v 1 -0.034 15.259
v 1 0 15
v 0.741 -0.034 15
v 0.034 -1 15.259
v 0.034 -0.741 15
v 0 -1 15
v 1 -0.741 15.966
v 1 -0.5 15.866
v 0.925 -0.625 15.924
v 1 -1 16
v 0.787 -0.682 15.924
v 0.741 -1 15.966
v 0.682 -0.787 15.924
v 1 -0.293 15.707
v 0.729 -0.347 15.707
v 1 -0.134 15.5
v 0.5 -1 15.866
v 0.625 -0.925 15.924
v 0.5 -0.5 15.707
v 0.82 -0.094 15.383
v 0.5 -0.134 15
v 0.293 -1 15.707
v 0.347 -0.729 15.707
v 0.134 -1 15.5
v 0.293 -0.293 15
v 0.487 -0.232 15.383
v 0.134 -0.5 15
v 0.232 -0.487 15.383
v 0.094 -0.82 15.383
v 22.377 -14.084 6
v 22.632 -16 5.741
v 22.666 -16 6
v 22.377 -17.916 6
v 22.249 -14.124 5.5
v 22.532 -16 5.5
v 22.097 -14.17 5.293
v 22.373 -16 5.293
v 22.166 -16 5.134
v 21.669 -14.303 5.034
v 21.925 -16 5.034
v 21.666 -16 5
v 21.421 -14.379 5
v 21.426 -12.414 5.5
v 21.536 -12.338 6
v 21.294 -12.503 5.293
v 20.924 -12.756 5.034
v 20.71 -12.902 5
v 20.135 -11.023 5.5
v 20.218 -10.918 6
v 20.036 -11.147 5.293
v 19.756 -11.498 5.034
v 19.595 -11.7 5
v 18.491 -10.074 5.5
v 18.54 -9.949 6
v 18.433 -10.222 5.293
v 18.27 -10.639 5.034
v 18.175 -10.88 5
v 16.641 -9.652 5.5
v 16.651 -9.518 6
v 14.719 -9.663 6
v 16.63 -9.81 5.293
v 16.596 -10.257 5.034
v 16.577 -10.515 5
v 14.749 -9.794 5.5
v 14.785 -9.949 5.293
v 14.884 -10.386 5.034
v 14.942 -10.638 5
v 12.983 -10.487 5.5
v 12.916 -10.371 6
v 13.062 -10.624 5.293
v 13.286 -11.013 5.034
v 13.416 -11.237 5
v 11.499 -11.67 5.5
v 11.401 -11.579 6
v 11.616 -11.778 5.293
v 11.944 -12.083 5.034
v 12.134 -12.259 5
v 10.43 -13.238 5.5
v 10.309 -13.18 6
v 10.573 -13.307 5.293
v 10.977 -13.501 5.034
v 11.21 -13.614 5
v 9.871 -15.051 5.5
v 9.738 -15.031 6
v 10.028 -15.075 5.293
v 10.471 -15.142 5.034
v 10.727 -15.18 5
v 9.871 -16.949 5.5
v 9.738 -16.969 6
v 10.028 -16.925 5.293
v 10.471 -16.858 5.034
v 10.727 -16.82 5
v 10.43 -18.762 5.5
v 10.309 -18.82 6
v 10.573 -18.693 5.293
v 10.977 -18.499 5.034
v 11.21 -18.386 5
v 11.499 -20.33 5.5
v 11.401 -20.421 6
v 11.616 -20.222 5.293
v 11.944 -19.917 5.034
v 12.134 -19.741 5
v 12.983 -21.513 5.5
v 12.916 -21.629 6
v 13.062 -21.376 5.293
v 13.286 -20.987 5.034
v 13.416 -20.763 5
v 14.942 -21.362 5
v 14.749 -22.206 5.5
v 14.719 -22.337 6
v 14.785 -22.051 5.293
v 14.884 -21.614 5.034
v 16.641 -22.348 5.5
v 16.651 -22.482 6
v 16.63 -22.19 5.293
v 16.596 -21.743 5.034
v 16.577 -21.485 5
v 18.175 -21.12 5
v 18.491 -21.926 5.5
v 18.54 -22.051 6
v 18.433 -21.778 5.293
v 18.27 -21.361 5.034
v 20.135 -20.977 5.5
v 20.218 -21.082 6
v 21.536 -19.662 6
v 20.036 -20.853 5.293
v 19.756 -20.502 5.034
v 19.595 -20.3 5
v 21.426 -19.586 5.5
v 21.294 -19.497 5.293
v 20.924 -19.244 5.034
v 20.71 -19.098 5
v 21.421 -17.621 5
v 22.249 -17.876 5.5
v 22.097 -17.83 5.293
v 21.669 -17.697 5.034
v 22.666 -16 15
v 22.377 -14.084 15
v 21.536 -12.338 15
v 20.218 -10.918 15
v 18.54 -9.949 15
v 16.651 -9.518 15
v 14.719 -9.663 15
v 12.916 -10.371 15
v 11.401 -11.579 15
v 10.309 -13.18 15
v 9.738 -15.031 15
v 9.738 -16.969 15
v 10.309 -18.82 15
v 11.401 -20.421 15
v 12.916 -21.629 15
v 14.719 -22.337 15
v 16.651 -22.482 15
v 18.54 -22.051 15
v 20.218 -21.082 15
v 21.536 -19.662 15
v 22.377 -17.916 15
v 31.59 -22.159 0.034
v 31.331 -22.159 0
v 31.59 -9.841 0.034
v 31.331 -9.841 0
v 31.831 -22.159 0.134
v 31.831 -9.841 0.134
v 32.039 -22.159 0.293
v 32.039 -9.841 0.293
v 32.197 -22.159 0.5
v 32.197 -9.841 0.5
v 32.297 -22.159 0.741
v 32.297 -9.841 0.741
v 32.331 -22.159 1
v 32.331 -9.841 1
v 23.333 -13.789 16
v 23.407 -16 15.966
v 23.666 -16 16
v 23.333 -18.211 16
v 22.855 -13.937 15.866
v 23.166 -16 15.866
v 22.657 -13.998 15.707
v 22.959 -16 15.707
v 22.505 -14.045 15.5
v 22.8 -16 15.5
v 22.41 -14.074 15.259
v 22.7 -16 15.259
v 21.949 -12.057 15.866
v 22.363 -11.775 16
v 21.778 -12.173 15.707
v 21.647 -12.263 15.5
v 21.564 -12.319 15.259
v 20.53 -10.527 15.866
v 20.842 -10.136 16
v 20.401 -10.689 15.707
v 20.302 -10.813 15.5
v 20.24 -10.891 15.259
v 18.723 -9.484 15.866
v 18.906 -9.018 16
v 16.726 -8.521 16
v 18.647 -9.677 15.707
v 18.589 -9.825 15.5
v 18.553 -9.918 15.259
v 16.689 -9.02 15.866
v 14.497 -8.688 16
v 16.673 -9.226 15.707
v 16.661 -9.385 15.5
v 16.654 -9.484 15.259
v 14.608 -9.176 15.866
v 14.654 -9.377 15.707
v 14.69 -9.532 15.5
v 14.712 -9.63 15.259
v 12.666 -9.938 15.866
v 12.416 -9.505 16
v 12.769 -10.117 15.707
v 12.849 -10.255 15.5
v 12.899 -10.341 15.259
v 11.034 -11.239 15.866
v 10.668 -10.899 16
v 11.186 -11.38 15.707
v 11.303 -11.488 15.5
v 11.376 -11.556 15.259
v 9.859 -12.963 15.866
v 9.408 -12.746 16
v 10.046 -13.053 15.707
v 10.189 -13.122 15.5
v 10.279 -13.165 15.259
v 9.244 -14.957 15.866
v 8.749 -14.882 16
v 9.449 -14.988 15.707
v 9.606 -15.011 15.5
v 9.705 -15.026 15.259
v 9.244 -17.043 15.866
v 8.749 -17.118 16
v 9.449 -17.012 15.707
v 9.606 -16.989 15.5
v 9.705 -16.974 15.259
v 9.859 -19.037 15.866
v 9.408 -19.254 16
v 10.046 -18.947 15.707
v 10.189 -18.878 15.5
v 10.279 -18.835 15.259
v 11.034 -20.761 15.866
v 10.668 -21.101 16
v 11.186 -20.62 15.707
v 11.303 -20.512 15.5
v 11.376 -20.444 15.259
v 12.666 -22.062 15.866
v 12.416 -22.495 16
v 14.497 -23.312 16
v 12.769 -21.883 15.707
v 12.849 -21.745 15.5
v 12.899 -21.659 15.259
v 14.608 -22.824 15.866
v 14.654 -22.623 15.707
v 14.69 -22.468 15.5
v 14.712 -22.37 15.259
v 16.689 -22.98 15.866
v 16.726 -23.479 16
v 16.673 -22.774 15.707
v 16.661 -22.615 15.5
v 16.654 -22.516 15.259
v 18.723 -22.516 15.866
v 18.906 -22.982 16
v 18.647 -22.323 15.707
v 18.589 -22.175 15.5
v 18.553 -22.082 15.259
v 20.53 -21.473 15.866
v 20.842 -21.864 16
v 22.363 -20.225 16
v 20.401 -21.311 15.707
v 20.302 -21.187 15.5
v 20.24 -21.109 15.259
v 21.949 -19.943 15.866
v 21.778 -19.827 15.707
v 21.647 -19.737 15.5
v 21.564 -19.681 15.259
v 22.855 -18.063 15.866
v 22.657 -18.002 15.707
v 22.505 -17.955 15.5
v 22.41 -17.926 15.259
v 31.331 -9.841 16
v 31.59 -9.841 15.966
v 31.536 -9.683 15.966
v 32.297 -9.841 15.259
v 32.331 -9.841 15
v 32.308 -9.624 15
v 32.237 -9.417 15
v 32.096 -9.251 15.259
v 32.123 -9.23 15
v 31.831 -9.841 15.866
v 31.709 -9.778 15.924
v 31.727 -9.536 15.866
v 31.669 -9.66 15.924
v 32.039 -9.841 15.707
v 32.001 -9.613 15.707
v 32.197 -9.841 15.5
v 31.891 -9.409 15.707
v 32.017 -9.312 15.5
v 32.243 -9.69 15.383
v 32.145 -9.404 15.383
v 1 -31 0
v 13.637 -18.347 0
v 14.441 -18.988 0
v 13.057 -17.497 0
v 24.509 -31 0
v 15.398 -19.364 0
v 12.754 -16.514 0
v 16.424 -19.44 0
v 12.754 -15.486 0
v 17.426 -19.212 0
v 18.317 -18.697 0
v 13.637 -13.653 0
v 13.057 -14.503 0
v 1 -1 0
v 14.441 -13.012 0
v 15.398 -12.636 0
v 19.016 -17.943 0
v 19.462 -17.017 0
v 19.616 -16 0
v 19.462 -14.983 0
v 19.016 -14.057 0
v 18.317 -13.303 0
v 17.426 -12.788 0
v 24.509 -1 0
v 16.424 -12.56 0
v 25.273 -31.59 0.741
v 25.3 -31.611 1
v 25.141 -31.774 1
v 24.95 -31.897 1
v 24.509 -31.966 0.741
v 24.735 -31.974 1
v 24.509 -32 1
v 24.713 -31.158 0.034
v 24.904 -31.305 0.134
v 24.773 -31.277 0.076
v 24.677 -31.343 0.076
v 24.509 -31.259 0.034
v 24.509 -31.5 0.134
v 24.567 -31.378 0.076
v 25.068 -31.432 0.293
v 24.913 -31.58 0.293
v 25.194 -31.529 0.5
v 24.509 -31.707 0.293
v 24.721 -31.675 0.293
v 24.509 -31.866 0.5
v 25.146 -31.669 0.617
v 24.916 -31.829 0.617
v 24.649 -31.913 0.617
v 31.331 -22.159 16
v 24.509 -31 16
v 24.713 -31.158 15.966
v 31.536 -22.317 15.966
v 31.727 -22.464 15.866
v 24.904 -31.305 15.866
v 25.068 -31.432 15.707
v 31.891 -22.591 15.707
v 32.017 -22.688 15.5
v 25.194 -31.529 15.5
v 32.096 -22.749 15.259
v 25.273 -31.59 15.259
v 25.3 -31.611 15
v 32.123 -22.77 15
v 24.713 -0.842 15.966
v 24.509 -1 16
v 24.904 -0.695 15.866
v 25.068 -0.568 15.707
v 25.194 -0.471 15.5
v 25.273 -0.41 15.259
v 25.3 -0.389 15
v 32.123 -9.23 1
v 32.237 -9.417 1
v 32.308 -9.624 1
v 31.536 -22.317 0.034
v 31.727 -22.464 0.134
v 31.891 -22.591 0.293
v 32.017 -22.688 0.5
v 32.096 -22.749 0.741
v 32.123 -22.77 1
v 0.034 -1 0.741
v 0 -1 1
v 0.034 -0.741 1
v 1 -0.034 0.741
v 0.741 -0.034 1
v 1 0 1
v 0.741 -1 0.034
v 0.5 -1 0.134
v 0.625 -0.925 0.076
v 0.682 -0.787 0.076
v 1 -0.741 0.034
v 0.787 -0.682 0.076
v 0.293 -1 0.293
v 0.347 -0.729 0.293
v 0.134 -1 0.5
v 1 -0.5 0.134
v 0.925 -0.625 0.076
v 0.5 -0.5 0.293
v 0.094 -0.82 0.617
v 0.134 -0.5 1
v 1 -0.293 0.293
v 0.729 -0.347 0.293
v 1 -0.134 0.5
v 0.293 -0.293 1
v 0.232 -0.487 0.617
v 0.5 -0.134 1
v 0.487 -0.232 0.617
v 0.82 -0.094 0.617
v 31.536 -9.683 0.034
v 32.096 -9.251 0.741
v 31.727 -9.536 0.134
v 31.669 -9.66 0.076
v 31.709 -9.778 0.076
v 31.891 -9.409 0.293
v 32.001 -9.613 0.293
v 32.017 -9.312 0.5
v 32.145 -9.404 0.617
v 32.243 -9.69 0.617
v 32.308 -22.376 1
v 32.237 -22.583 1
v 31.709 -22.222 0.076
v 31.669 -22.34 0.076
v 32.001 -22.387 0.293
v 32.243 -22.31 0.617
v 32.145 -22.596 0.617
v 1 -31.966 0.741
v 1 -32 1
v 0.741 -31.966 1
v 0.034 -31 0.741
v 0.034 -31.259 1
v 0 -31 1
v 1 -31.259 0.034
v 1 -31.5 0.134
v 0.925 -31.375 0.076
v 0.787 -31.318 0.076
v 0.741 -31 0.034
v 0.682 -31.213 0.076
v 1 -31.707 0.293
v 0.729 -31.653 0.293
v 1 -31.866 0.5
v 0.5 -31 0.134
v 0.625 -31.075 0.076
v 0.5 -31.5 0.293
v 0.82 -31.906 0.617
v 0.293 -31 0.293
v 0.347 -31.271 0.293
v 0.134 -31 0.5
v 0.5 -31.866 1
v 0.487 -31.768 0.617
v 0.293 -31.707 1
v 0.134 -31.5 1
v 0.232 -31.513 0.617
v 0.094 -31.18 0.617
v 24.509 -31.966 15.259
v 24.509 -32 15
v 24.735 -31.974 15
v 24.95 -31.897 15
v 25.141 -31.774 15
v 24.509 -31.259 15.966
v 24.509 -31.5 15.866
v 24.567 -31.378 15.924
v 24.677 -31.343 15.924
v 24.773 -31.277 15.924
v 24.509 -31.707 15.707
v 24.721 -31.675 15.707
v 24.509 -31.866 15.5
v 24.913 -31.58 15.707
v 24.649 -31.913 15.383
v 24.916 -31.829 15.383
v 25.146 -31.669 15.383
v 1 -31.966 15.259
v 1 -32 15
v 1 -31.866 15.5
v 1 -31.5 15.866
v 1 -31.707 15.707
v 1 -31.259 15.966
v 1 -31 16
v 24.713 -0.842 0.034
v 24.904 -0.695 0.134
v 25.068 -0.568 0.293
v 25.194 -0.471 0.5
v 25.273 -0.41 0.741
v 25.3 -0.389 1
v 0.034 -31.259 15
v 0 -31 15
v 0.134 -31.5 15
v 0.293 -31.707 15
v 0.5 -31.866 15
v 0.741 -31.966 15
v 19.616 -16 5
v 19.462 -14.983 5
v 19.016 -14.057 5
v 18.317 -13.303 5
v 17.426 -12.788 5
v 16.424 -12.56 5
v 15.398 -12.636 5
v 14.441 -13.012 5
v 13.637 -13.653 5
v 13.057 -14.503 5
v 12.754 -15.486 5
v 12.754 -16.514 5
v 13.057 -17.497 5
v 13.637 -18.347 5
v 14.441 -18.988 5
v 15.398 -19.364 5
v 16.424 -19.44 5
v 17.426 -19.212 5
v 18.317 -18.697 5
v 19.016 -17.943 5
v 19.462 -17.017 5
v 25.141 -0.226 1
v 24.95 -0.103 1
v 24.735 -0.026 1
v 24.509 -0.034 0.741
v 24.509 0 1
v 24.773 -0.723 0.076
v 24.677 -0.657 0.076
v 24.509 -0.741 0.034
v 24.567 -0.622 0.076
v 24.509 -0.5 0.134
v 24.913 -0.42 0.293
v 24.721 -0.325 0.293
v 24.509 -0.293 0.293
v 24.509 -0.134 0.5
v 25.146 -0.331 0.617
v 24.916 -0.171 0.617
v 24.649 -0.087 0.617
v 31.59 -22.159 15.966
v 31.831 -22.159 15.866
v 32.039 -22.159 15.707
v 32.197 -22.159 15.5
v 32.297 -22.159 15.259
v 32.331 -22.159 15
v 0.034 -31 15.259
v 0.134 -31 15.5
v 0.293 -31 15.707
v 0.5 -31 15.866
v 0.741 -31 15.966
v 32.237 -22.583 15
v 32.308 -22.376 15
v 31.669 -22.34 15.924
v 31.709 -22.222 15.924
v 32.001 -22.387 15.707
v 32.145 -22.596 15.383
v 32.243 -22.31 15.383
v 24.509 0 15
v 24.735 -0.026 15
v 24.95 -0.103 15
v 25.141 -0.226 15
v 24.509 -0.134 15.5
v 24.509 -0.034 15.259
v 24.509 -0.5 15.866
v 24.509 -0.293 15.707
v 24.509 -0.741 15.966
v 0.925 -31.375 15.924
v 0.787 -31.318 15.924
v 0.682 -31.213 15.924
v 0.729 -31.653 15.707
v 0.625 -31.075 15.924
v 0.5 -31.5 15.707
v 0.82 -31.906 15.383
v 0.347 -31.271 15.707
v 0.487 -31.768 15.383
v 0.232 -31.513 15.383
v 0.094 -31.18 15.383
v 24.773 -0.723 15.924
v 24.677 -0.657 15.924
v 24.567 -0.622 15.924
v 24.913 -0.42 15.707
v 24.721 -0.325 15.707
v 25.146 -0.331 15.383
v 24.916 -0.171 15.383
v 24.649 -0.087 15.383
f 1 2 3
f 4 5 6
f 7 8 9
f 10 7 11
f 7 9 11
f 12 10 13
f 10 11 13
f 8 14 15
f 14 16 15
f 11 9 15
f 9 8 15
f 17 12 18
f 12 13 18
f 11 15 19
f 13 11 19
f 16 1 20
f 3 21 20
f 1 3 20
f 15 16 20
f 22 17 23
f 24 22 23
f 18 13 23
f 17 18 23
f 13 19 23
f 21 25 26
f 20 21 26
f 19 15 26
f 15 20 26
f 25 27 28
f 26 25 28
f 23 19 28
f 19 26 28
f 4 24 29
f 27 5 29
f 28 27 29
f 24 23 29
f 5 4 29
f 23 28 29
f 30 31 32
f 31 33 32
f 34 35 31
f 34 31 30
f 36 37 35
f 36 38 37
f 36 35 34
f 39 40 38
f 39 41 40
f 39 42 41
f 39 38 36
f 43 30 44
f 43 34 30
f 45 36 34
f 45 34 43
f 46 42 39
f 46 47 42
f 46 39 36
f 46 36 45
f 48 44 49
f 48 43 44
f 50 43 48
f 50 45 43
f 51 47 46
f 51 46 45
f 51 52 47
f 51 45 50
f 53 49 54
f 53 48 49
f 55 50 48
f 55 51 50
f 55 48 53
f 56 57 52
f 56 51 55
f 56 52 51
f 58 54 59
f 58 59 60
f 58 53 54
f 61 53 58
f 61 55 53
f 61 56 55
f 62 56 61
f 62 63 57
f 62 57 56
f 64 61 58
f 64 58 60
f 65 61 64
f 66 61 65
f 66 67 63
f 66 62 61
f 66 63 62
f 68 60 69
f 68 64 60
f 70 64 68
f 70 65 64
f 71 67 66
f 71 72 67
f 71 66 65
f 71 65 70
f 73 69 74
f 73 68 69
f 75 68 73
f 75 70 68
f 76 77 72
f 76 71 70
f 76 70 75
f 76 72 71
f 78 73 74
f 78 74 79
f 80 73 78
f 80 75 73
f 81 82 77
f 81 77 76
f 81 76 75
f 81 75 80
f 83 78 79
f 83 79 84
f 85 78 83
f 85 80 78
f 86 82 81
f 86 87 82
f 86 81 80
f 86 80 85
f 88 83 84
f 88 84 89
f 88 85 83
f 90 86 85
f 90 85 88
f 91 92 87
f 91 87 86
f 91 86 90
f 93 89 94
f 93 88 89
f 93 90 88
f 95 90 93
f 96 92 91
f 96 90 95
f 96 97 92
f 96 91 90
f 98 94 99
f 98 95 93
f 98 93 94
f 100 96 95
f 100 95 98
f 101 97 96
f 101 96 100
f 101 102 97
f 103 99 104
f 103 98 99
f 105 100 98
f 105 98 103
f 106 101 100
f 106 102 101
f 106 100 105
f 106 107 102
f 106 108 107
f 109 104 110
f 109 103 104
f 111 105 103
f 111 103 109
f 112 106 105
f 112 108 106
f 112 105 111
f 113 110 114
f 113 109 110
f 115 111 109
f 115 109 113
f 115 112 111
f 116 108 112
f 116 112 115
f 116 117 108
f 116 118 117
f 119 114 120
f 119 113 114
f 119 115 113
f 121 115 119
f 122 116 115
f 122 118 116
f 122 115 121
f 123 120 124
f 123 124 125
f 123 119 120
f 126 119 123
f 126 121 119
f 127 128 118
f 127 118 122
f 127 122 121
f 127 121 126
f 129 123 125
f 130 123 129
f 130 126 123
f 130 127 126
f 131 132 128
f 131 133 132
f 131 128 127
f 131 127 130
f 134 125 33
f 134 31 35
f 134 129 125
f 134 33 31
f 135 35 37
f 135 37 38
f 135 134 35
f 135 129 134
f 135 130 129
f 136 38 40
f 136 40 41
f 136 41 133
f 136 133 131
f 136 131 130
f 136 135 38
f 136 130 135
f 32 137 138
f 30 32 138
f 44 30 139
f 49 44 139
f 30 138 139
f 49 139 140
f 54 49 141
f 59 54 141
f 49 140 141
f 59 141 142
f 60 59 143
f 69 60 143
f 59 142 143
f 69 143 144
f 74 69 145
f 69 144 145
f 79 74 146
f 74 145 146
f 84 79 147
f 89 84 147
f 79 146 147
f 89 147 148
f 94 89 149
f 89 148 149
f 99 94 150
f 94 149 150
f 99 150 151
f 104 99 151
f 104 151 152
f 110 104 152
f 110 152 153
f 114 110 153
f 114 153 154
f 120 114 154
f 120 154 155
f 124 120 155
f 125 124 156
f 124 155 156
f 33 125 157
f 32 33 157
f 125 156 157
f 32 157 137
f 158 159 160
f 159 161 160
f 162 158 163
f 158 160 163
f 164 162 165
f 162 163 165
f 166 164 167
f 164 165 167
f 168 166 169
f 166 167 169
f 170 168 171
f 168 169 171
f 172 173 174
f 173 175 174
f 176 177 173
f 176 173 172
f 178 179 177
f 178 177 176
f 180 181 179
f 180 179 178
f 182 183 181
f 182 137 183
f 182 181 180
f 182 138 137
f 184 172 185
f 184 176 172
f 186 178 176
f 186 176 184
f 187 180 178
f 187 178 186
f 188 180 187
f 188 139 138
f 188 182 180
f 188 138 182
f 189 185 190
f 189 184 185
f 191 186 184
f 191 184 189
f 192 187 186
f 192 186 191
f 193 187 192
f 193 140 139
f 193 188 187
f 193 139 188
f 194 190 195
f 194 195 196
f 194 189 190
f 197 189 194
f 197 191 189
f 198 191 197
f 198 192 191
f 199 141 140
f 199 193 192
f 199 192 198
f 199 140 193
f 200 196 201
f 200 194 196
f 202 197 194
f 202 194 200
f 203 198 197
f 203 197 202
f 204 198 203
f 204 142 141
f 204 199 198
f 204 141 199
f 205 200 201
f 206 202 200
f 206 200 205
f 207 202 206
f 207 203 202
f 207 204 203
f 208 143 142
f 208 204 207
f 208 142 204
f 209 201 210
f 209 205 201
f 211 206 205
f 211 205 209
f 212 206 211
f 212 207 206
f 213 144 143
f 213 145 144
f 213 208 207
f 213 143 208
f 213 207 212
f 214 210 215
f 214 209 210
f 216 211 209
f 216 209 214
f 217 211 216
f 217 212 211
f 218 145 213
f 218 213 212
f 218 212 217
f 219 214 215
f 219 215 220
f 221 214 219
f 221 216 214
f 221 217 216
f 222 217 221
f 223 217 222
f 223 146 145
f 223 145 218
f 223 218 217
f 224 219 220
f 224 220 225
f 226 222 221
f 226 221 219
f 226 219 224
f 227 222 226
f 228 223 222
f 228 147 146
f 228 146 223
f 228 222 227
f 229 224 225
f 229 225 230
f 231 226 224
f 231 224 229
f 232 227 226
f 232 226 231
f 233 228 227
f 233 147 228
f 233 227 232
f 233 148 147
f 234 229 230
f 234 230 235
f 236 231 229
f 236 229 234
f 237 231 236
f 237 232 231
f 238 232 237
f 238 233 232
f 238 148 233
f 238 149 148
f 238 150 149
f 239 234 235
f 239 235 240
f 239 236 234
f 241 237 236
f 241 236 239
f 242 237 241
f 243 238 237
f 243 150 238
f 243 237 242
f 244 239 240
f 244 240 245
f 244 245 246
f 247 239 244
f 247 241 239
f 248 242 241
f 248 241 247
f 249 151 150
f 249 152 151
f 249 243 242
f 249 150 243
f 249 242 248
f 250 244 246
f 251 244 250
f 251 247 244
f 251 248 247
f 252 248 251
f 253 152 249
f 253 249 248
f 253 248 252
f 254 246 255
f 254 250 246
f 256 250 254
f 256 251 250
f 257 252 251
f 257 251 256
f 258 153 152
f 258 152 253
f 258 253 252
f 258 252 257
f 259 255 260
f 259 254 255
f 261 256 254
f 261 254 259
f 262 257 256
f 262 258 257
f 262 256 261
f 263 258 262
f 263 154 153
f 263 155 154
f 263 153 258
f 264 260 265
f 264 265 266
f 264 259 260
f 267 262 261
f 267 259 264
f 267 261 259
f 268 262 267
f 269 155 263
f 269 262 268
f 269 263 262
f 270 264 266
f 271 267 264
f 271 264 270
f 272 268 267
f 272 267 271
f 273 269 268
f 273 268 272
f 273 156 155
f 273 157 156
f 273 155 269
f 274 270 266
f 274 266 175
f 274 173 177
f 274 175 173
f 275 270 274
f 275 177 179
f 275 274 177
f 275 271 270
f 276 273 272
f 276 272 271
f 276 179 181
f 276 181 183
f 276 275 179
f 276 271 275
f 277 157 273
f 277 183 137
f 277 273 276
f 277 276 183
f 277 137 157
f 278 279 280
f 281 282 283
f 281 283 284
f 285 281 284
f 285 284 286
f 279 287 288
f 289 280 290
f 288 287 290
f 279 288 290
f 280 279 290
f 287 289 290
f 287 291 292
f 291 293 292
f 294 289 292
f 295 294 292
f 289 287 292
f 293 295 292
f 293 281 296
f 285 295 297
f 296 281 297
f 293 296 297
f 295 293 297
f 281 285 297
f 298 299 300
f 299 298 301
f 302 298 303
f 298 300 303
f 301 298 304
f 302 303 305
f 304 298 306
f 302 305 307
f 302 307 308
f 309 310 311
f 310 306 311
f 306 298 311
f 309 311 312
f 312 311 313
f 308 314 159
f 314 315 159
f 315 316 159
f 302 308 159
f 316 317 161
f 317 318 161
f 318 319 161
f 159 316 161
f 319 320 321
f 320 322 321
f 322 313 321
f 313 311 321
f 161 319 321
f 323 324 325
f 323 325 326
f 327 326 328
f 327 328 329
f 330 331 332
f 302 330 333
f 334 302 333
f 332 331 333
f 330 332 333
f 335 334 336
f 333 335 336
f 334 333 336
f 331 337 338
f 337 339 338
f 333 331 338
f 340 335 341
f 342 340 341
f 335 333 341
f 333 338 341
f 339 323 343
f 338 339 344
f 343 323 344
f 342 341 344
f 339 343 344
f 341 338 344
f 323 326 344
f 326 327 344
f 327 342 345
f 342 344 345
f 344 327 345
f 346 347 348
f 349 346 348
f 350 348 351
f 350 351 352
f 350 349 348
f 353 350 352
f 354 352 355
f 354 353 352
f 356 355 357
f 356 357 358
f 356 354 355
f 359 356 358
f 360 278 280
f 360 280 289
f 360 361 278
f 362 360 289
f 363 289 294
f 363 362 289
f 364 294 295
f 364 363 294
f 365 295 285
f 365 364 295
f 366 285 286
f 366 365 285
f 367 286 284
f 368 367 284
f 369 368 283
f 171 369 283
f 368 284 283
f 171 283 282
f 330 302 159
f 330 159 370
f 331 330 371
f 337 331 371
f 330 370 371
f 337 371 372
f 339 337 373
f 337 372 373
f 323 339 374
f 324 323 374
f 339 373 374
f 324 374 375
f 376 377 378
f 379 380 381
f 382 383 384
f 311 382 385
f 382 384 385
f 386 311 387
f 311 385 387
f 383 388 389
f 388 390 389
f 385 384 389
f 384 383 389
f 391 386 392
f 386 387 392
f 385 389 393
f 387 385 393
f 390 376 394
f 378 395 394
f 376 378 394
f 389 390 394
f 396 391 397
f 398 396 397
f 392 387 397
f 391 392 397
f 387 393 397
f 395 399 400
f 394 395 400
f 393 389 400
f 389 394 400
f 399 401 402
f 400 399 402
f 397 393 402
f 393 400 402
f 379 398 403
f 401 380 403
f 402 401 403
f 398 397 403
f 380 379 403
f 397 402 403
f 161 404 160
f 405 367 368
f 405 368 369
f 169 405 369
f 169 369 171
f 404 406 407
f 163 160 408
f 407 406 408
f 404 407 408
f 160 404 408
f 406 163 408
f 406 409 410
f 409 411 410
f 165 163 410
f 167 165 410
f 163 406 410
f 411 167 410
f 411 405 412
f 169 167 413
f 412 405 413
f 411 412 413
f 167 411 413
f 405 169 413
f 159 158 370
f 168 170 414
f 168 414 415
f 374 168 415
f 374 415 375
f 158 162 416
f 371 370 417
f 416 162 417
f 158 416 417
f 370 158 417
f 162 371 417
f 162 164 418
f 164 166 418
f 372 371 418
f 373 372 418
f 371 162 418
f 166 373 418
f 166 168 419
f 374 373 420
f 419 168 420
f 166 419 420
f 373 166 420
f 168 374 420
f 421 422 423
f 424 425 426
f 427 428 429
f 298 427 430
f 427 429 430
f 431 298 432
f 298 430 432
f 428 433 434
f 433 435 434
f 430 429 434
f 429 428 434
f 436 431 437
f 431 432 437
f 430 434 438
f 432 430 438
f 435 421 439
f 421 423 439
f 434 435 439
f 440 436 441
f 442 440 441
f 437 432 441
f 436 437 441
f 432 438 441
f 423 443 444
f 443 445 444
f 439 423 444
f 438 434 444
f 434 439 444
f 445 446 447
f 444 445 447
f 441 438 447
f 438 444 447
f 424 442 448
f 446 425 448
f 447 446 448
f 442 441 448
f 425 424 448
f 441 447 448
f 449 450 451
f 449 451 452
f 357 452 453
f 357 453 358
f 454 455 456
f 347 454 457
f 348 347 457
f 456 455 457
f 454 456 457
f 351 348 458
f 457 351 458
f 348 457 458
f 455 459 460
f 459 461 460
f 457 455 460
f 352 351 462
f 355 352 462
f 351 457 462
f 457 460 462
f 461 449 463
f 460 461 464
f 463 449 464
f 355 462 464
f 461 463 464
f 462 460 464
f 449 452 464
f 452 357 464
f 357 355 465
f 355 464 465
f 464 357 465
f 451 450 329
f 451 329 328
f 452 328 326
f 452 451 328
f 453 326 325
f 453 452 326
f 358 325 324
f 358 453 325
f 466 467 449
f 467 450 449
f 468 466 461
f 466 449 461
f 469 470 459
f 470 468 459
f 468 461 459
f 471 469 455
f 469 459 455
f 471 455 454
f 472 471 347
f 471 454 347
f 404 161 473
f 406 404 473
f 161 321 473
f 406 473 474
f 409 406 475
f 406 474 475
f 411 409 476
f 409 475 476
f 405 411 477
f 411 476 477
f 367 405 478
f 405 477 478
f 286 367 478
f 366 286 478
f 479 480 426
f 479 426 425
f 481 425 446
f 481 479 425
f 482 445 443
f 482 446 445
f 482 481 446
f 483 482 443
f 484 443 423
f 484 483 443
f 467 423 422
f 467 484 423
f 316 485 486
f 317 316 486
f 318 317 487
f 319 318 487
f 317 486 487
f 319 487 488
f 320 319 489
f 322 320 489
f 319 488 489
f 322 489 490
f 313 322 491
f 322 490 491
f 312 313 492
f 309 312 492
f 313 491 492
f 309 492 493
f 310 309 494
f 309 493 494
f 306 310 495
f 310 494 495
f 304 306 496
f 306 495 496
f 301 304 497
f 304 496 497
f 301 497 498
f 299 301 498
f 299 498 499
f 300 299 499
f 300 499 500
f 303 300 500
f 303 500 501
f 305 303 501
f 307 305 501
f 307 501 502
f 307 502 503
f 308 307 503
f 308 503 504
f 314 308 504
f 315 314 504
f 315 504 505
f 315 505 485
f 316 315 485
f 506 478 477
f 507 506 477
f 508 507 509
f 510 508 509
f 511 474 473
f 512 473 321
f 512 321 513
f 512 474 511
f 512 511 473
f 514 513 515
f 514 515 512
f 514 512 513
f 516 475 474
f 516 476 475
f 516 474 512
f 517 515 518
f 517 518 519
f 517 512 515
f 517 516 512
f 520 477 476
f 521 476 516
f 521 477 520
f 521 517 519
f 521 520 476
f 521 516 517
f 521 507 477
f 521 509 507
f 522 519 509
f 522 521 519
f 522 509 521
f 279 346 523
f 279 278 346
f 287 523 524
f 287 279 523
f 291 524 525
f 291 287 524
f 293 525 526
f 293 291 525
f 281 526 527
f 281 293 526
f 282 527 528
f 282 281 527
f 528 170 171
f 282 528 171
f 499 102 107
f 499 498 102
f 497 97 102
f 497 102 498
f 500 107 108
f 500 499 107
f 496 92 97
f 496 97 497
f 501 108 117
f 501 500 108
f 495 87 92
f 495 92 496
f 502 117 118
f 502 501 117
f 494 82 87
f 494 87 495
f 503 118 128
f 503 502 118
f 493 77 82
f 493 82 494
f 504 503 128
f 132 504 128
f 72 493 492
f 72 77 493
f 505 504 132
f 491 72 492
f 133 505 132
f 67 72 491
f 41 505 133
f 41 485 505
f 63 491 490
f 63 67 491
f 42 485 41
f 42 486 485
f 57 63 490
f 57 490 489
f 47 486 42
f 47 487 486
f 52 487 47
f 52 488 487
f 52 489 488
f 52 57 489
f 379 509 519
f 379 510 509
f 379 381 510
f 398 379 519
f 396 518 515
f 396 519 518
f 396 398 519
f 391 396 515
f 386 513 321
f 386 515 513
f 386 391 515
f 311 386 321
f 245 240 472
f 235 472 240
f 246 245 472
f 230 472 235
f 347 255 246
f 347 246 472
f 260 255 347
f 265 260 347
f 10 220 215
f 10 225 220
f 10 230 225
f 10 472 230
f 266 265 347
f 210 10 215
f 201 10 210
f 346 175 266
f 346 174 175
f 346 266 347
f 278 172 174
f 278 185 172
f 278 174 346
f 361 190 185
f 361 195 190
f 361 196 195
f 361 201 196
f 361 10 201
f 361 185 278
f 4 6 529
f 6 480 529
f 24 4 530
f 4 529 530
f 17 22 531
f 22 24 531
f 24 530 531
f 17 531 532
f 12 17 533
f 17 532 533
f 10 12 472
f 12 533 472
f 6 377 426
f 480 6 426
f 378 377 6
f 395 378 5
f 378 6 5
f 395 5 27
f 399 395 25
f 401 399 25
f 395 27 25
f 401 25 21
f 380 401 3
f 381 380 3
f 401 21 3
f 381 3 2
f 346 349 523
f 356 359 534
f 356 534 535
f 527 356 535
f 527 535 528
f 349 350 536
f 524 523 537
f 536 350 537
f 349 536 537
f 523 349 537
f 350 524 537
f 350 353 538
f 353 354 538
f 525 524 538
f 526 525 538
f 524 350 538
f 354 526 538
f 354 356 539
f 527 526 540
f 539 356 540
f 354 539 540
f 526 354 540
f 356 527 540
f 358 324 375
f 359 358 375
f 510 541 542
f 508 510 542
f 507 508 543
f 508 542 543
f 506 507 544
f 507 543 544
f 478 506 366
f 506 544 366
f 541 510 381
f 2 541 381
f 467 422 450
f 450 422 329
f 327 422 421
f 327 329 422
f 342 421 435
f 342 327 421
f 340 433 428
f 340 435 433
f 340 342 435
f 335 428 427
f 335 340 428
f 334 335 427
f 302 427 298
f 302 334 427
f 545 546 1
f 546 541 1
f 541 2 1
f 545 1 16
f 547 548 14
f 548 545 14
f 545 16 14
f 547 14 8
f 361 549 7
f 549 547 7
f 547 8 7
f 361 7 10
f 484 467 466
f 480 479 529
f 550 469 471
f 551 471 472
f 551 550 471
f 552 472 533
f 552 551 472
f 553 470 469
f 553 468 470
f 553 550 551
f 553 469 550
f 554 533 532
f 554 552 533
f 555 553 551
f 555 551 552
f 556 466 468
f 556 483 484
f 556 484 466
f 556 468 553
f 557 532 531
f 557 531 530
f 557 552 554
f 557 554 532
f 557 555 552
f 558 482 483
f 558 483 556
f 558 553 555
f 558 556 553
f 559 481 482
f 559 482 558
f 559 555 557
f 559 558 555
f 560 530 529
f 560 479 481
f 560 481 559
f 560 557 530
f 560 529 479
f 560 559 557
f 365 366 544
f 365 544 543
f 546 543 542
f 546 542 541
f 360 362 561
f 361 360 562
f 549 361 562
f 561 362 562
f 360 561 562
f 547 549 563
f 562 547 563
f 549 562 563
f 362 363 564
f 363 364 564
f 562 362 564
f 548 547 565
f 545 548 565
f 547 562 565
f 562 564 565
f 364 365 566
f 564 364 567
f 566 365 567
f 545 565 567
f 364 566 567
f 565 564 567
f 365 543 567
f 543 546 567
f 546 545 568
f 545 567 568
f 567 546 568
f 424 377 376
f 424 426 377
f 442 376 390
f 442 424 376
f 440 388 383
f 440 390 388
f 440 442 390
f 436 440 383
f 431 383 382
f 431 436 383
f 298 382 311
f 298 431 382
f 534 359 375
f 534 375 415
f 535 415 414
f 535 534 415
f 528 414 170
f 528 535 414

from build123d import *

# Parameters (mm, degrees)
BOSS_EXTRUDE1_DEPTH = 16
SKETCH4_R           = 6.5
CUT_EXTRUDE1_DEPTH  = 11
SKETCH5_R           = 3.45
CUT_EXTRUDE2_DEPTH  = 11
FILLET1_R           = 1


with BuildPart() as part:
    # Sketch3 → Boss-Extrude1 (new body)
    with BuildSketch(Plane.XY):
        Polygon((0, 0), (0, -32), (25, -32), (32.331439149, -22.5), (32.331439149, -9.5), (25, 0), align=None)
    extrude(amount=BOSS_EXTRUDE1_DEPTH)

    # Sketch4 → Cut-Extrude1 (cut)
    with BuildSketch(Plane.XY.offset(16)):
        with Locations((16.165719575, -16)):
            Circle(SKETCH4_R)
    extrude(amount=-CUT_EXTRUDE1_DEPTH, mode=Mode.SUBTRACT)

    # Sketch5 → Cut-Extrude2 (cut)
    with BuildSketch(Plane.XY.offset(5)):
        with Locations((16.165719575, -16)):
            Circle(SKETCH5_R)
    extrude(amount=-CUT_EXTRUDE2_DEPTH, mode=Mode.SUBTRACT)

    # Fillet1
    fillet1_edges = [part.edges().sort_by_distance(p)[0] for p in [
        (25, 0, 8),
        (32.331439149, -9.5, 8),
        (32.331439149, -22.5, 8),
        (25, -32, 8),
        (0, -32, 8),
        (0, 0, 8),
        (12.5, -32, 16),
        (28.665719575, -27.25, 16),
        (32.331439149, -16, 16),
        (9.665719575, -16, 5),
        (9.665719575, -16, 16),
        (28.665719575, -4.75, 16),
        (12.5, 0, 16),
        (28.665719575, -4.75, 0),
        (32.331439149, -16, 0),
        (28.665719575, -27.25, 0),
        (12.5, -32, 0),
        (0, -16, 0),
        (12.5, 0, 0),
        (0, -16, 16),
    ]]
    fillet(fillet1_edges, radius=FILLET1_R)


solid = part.part
